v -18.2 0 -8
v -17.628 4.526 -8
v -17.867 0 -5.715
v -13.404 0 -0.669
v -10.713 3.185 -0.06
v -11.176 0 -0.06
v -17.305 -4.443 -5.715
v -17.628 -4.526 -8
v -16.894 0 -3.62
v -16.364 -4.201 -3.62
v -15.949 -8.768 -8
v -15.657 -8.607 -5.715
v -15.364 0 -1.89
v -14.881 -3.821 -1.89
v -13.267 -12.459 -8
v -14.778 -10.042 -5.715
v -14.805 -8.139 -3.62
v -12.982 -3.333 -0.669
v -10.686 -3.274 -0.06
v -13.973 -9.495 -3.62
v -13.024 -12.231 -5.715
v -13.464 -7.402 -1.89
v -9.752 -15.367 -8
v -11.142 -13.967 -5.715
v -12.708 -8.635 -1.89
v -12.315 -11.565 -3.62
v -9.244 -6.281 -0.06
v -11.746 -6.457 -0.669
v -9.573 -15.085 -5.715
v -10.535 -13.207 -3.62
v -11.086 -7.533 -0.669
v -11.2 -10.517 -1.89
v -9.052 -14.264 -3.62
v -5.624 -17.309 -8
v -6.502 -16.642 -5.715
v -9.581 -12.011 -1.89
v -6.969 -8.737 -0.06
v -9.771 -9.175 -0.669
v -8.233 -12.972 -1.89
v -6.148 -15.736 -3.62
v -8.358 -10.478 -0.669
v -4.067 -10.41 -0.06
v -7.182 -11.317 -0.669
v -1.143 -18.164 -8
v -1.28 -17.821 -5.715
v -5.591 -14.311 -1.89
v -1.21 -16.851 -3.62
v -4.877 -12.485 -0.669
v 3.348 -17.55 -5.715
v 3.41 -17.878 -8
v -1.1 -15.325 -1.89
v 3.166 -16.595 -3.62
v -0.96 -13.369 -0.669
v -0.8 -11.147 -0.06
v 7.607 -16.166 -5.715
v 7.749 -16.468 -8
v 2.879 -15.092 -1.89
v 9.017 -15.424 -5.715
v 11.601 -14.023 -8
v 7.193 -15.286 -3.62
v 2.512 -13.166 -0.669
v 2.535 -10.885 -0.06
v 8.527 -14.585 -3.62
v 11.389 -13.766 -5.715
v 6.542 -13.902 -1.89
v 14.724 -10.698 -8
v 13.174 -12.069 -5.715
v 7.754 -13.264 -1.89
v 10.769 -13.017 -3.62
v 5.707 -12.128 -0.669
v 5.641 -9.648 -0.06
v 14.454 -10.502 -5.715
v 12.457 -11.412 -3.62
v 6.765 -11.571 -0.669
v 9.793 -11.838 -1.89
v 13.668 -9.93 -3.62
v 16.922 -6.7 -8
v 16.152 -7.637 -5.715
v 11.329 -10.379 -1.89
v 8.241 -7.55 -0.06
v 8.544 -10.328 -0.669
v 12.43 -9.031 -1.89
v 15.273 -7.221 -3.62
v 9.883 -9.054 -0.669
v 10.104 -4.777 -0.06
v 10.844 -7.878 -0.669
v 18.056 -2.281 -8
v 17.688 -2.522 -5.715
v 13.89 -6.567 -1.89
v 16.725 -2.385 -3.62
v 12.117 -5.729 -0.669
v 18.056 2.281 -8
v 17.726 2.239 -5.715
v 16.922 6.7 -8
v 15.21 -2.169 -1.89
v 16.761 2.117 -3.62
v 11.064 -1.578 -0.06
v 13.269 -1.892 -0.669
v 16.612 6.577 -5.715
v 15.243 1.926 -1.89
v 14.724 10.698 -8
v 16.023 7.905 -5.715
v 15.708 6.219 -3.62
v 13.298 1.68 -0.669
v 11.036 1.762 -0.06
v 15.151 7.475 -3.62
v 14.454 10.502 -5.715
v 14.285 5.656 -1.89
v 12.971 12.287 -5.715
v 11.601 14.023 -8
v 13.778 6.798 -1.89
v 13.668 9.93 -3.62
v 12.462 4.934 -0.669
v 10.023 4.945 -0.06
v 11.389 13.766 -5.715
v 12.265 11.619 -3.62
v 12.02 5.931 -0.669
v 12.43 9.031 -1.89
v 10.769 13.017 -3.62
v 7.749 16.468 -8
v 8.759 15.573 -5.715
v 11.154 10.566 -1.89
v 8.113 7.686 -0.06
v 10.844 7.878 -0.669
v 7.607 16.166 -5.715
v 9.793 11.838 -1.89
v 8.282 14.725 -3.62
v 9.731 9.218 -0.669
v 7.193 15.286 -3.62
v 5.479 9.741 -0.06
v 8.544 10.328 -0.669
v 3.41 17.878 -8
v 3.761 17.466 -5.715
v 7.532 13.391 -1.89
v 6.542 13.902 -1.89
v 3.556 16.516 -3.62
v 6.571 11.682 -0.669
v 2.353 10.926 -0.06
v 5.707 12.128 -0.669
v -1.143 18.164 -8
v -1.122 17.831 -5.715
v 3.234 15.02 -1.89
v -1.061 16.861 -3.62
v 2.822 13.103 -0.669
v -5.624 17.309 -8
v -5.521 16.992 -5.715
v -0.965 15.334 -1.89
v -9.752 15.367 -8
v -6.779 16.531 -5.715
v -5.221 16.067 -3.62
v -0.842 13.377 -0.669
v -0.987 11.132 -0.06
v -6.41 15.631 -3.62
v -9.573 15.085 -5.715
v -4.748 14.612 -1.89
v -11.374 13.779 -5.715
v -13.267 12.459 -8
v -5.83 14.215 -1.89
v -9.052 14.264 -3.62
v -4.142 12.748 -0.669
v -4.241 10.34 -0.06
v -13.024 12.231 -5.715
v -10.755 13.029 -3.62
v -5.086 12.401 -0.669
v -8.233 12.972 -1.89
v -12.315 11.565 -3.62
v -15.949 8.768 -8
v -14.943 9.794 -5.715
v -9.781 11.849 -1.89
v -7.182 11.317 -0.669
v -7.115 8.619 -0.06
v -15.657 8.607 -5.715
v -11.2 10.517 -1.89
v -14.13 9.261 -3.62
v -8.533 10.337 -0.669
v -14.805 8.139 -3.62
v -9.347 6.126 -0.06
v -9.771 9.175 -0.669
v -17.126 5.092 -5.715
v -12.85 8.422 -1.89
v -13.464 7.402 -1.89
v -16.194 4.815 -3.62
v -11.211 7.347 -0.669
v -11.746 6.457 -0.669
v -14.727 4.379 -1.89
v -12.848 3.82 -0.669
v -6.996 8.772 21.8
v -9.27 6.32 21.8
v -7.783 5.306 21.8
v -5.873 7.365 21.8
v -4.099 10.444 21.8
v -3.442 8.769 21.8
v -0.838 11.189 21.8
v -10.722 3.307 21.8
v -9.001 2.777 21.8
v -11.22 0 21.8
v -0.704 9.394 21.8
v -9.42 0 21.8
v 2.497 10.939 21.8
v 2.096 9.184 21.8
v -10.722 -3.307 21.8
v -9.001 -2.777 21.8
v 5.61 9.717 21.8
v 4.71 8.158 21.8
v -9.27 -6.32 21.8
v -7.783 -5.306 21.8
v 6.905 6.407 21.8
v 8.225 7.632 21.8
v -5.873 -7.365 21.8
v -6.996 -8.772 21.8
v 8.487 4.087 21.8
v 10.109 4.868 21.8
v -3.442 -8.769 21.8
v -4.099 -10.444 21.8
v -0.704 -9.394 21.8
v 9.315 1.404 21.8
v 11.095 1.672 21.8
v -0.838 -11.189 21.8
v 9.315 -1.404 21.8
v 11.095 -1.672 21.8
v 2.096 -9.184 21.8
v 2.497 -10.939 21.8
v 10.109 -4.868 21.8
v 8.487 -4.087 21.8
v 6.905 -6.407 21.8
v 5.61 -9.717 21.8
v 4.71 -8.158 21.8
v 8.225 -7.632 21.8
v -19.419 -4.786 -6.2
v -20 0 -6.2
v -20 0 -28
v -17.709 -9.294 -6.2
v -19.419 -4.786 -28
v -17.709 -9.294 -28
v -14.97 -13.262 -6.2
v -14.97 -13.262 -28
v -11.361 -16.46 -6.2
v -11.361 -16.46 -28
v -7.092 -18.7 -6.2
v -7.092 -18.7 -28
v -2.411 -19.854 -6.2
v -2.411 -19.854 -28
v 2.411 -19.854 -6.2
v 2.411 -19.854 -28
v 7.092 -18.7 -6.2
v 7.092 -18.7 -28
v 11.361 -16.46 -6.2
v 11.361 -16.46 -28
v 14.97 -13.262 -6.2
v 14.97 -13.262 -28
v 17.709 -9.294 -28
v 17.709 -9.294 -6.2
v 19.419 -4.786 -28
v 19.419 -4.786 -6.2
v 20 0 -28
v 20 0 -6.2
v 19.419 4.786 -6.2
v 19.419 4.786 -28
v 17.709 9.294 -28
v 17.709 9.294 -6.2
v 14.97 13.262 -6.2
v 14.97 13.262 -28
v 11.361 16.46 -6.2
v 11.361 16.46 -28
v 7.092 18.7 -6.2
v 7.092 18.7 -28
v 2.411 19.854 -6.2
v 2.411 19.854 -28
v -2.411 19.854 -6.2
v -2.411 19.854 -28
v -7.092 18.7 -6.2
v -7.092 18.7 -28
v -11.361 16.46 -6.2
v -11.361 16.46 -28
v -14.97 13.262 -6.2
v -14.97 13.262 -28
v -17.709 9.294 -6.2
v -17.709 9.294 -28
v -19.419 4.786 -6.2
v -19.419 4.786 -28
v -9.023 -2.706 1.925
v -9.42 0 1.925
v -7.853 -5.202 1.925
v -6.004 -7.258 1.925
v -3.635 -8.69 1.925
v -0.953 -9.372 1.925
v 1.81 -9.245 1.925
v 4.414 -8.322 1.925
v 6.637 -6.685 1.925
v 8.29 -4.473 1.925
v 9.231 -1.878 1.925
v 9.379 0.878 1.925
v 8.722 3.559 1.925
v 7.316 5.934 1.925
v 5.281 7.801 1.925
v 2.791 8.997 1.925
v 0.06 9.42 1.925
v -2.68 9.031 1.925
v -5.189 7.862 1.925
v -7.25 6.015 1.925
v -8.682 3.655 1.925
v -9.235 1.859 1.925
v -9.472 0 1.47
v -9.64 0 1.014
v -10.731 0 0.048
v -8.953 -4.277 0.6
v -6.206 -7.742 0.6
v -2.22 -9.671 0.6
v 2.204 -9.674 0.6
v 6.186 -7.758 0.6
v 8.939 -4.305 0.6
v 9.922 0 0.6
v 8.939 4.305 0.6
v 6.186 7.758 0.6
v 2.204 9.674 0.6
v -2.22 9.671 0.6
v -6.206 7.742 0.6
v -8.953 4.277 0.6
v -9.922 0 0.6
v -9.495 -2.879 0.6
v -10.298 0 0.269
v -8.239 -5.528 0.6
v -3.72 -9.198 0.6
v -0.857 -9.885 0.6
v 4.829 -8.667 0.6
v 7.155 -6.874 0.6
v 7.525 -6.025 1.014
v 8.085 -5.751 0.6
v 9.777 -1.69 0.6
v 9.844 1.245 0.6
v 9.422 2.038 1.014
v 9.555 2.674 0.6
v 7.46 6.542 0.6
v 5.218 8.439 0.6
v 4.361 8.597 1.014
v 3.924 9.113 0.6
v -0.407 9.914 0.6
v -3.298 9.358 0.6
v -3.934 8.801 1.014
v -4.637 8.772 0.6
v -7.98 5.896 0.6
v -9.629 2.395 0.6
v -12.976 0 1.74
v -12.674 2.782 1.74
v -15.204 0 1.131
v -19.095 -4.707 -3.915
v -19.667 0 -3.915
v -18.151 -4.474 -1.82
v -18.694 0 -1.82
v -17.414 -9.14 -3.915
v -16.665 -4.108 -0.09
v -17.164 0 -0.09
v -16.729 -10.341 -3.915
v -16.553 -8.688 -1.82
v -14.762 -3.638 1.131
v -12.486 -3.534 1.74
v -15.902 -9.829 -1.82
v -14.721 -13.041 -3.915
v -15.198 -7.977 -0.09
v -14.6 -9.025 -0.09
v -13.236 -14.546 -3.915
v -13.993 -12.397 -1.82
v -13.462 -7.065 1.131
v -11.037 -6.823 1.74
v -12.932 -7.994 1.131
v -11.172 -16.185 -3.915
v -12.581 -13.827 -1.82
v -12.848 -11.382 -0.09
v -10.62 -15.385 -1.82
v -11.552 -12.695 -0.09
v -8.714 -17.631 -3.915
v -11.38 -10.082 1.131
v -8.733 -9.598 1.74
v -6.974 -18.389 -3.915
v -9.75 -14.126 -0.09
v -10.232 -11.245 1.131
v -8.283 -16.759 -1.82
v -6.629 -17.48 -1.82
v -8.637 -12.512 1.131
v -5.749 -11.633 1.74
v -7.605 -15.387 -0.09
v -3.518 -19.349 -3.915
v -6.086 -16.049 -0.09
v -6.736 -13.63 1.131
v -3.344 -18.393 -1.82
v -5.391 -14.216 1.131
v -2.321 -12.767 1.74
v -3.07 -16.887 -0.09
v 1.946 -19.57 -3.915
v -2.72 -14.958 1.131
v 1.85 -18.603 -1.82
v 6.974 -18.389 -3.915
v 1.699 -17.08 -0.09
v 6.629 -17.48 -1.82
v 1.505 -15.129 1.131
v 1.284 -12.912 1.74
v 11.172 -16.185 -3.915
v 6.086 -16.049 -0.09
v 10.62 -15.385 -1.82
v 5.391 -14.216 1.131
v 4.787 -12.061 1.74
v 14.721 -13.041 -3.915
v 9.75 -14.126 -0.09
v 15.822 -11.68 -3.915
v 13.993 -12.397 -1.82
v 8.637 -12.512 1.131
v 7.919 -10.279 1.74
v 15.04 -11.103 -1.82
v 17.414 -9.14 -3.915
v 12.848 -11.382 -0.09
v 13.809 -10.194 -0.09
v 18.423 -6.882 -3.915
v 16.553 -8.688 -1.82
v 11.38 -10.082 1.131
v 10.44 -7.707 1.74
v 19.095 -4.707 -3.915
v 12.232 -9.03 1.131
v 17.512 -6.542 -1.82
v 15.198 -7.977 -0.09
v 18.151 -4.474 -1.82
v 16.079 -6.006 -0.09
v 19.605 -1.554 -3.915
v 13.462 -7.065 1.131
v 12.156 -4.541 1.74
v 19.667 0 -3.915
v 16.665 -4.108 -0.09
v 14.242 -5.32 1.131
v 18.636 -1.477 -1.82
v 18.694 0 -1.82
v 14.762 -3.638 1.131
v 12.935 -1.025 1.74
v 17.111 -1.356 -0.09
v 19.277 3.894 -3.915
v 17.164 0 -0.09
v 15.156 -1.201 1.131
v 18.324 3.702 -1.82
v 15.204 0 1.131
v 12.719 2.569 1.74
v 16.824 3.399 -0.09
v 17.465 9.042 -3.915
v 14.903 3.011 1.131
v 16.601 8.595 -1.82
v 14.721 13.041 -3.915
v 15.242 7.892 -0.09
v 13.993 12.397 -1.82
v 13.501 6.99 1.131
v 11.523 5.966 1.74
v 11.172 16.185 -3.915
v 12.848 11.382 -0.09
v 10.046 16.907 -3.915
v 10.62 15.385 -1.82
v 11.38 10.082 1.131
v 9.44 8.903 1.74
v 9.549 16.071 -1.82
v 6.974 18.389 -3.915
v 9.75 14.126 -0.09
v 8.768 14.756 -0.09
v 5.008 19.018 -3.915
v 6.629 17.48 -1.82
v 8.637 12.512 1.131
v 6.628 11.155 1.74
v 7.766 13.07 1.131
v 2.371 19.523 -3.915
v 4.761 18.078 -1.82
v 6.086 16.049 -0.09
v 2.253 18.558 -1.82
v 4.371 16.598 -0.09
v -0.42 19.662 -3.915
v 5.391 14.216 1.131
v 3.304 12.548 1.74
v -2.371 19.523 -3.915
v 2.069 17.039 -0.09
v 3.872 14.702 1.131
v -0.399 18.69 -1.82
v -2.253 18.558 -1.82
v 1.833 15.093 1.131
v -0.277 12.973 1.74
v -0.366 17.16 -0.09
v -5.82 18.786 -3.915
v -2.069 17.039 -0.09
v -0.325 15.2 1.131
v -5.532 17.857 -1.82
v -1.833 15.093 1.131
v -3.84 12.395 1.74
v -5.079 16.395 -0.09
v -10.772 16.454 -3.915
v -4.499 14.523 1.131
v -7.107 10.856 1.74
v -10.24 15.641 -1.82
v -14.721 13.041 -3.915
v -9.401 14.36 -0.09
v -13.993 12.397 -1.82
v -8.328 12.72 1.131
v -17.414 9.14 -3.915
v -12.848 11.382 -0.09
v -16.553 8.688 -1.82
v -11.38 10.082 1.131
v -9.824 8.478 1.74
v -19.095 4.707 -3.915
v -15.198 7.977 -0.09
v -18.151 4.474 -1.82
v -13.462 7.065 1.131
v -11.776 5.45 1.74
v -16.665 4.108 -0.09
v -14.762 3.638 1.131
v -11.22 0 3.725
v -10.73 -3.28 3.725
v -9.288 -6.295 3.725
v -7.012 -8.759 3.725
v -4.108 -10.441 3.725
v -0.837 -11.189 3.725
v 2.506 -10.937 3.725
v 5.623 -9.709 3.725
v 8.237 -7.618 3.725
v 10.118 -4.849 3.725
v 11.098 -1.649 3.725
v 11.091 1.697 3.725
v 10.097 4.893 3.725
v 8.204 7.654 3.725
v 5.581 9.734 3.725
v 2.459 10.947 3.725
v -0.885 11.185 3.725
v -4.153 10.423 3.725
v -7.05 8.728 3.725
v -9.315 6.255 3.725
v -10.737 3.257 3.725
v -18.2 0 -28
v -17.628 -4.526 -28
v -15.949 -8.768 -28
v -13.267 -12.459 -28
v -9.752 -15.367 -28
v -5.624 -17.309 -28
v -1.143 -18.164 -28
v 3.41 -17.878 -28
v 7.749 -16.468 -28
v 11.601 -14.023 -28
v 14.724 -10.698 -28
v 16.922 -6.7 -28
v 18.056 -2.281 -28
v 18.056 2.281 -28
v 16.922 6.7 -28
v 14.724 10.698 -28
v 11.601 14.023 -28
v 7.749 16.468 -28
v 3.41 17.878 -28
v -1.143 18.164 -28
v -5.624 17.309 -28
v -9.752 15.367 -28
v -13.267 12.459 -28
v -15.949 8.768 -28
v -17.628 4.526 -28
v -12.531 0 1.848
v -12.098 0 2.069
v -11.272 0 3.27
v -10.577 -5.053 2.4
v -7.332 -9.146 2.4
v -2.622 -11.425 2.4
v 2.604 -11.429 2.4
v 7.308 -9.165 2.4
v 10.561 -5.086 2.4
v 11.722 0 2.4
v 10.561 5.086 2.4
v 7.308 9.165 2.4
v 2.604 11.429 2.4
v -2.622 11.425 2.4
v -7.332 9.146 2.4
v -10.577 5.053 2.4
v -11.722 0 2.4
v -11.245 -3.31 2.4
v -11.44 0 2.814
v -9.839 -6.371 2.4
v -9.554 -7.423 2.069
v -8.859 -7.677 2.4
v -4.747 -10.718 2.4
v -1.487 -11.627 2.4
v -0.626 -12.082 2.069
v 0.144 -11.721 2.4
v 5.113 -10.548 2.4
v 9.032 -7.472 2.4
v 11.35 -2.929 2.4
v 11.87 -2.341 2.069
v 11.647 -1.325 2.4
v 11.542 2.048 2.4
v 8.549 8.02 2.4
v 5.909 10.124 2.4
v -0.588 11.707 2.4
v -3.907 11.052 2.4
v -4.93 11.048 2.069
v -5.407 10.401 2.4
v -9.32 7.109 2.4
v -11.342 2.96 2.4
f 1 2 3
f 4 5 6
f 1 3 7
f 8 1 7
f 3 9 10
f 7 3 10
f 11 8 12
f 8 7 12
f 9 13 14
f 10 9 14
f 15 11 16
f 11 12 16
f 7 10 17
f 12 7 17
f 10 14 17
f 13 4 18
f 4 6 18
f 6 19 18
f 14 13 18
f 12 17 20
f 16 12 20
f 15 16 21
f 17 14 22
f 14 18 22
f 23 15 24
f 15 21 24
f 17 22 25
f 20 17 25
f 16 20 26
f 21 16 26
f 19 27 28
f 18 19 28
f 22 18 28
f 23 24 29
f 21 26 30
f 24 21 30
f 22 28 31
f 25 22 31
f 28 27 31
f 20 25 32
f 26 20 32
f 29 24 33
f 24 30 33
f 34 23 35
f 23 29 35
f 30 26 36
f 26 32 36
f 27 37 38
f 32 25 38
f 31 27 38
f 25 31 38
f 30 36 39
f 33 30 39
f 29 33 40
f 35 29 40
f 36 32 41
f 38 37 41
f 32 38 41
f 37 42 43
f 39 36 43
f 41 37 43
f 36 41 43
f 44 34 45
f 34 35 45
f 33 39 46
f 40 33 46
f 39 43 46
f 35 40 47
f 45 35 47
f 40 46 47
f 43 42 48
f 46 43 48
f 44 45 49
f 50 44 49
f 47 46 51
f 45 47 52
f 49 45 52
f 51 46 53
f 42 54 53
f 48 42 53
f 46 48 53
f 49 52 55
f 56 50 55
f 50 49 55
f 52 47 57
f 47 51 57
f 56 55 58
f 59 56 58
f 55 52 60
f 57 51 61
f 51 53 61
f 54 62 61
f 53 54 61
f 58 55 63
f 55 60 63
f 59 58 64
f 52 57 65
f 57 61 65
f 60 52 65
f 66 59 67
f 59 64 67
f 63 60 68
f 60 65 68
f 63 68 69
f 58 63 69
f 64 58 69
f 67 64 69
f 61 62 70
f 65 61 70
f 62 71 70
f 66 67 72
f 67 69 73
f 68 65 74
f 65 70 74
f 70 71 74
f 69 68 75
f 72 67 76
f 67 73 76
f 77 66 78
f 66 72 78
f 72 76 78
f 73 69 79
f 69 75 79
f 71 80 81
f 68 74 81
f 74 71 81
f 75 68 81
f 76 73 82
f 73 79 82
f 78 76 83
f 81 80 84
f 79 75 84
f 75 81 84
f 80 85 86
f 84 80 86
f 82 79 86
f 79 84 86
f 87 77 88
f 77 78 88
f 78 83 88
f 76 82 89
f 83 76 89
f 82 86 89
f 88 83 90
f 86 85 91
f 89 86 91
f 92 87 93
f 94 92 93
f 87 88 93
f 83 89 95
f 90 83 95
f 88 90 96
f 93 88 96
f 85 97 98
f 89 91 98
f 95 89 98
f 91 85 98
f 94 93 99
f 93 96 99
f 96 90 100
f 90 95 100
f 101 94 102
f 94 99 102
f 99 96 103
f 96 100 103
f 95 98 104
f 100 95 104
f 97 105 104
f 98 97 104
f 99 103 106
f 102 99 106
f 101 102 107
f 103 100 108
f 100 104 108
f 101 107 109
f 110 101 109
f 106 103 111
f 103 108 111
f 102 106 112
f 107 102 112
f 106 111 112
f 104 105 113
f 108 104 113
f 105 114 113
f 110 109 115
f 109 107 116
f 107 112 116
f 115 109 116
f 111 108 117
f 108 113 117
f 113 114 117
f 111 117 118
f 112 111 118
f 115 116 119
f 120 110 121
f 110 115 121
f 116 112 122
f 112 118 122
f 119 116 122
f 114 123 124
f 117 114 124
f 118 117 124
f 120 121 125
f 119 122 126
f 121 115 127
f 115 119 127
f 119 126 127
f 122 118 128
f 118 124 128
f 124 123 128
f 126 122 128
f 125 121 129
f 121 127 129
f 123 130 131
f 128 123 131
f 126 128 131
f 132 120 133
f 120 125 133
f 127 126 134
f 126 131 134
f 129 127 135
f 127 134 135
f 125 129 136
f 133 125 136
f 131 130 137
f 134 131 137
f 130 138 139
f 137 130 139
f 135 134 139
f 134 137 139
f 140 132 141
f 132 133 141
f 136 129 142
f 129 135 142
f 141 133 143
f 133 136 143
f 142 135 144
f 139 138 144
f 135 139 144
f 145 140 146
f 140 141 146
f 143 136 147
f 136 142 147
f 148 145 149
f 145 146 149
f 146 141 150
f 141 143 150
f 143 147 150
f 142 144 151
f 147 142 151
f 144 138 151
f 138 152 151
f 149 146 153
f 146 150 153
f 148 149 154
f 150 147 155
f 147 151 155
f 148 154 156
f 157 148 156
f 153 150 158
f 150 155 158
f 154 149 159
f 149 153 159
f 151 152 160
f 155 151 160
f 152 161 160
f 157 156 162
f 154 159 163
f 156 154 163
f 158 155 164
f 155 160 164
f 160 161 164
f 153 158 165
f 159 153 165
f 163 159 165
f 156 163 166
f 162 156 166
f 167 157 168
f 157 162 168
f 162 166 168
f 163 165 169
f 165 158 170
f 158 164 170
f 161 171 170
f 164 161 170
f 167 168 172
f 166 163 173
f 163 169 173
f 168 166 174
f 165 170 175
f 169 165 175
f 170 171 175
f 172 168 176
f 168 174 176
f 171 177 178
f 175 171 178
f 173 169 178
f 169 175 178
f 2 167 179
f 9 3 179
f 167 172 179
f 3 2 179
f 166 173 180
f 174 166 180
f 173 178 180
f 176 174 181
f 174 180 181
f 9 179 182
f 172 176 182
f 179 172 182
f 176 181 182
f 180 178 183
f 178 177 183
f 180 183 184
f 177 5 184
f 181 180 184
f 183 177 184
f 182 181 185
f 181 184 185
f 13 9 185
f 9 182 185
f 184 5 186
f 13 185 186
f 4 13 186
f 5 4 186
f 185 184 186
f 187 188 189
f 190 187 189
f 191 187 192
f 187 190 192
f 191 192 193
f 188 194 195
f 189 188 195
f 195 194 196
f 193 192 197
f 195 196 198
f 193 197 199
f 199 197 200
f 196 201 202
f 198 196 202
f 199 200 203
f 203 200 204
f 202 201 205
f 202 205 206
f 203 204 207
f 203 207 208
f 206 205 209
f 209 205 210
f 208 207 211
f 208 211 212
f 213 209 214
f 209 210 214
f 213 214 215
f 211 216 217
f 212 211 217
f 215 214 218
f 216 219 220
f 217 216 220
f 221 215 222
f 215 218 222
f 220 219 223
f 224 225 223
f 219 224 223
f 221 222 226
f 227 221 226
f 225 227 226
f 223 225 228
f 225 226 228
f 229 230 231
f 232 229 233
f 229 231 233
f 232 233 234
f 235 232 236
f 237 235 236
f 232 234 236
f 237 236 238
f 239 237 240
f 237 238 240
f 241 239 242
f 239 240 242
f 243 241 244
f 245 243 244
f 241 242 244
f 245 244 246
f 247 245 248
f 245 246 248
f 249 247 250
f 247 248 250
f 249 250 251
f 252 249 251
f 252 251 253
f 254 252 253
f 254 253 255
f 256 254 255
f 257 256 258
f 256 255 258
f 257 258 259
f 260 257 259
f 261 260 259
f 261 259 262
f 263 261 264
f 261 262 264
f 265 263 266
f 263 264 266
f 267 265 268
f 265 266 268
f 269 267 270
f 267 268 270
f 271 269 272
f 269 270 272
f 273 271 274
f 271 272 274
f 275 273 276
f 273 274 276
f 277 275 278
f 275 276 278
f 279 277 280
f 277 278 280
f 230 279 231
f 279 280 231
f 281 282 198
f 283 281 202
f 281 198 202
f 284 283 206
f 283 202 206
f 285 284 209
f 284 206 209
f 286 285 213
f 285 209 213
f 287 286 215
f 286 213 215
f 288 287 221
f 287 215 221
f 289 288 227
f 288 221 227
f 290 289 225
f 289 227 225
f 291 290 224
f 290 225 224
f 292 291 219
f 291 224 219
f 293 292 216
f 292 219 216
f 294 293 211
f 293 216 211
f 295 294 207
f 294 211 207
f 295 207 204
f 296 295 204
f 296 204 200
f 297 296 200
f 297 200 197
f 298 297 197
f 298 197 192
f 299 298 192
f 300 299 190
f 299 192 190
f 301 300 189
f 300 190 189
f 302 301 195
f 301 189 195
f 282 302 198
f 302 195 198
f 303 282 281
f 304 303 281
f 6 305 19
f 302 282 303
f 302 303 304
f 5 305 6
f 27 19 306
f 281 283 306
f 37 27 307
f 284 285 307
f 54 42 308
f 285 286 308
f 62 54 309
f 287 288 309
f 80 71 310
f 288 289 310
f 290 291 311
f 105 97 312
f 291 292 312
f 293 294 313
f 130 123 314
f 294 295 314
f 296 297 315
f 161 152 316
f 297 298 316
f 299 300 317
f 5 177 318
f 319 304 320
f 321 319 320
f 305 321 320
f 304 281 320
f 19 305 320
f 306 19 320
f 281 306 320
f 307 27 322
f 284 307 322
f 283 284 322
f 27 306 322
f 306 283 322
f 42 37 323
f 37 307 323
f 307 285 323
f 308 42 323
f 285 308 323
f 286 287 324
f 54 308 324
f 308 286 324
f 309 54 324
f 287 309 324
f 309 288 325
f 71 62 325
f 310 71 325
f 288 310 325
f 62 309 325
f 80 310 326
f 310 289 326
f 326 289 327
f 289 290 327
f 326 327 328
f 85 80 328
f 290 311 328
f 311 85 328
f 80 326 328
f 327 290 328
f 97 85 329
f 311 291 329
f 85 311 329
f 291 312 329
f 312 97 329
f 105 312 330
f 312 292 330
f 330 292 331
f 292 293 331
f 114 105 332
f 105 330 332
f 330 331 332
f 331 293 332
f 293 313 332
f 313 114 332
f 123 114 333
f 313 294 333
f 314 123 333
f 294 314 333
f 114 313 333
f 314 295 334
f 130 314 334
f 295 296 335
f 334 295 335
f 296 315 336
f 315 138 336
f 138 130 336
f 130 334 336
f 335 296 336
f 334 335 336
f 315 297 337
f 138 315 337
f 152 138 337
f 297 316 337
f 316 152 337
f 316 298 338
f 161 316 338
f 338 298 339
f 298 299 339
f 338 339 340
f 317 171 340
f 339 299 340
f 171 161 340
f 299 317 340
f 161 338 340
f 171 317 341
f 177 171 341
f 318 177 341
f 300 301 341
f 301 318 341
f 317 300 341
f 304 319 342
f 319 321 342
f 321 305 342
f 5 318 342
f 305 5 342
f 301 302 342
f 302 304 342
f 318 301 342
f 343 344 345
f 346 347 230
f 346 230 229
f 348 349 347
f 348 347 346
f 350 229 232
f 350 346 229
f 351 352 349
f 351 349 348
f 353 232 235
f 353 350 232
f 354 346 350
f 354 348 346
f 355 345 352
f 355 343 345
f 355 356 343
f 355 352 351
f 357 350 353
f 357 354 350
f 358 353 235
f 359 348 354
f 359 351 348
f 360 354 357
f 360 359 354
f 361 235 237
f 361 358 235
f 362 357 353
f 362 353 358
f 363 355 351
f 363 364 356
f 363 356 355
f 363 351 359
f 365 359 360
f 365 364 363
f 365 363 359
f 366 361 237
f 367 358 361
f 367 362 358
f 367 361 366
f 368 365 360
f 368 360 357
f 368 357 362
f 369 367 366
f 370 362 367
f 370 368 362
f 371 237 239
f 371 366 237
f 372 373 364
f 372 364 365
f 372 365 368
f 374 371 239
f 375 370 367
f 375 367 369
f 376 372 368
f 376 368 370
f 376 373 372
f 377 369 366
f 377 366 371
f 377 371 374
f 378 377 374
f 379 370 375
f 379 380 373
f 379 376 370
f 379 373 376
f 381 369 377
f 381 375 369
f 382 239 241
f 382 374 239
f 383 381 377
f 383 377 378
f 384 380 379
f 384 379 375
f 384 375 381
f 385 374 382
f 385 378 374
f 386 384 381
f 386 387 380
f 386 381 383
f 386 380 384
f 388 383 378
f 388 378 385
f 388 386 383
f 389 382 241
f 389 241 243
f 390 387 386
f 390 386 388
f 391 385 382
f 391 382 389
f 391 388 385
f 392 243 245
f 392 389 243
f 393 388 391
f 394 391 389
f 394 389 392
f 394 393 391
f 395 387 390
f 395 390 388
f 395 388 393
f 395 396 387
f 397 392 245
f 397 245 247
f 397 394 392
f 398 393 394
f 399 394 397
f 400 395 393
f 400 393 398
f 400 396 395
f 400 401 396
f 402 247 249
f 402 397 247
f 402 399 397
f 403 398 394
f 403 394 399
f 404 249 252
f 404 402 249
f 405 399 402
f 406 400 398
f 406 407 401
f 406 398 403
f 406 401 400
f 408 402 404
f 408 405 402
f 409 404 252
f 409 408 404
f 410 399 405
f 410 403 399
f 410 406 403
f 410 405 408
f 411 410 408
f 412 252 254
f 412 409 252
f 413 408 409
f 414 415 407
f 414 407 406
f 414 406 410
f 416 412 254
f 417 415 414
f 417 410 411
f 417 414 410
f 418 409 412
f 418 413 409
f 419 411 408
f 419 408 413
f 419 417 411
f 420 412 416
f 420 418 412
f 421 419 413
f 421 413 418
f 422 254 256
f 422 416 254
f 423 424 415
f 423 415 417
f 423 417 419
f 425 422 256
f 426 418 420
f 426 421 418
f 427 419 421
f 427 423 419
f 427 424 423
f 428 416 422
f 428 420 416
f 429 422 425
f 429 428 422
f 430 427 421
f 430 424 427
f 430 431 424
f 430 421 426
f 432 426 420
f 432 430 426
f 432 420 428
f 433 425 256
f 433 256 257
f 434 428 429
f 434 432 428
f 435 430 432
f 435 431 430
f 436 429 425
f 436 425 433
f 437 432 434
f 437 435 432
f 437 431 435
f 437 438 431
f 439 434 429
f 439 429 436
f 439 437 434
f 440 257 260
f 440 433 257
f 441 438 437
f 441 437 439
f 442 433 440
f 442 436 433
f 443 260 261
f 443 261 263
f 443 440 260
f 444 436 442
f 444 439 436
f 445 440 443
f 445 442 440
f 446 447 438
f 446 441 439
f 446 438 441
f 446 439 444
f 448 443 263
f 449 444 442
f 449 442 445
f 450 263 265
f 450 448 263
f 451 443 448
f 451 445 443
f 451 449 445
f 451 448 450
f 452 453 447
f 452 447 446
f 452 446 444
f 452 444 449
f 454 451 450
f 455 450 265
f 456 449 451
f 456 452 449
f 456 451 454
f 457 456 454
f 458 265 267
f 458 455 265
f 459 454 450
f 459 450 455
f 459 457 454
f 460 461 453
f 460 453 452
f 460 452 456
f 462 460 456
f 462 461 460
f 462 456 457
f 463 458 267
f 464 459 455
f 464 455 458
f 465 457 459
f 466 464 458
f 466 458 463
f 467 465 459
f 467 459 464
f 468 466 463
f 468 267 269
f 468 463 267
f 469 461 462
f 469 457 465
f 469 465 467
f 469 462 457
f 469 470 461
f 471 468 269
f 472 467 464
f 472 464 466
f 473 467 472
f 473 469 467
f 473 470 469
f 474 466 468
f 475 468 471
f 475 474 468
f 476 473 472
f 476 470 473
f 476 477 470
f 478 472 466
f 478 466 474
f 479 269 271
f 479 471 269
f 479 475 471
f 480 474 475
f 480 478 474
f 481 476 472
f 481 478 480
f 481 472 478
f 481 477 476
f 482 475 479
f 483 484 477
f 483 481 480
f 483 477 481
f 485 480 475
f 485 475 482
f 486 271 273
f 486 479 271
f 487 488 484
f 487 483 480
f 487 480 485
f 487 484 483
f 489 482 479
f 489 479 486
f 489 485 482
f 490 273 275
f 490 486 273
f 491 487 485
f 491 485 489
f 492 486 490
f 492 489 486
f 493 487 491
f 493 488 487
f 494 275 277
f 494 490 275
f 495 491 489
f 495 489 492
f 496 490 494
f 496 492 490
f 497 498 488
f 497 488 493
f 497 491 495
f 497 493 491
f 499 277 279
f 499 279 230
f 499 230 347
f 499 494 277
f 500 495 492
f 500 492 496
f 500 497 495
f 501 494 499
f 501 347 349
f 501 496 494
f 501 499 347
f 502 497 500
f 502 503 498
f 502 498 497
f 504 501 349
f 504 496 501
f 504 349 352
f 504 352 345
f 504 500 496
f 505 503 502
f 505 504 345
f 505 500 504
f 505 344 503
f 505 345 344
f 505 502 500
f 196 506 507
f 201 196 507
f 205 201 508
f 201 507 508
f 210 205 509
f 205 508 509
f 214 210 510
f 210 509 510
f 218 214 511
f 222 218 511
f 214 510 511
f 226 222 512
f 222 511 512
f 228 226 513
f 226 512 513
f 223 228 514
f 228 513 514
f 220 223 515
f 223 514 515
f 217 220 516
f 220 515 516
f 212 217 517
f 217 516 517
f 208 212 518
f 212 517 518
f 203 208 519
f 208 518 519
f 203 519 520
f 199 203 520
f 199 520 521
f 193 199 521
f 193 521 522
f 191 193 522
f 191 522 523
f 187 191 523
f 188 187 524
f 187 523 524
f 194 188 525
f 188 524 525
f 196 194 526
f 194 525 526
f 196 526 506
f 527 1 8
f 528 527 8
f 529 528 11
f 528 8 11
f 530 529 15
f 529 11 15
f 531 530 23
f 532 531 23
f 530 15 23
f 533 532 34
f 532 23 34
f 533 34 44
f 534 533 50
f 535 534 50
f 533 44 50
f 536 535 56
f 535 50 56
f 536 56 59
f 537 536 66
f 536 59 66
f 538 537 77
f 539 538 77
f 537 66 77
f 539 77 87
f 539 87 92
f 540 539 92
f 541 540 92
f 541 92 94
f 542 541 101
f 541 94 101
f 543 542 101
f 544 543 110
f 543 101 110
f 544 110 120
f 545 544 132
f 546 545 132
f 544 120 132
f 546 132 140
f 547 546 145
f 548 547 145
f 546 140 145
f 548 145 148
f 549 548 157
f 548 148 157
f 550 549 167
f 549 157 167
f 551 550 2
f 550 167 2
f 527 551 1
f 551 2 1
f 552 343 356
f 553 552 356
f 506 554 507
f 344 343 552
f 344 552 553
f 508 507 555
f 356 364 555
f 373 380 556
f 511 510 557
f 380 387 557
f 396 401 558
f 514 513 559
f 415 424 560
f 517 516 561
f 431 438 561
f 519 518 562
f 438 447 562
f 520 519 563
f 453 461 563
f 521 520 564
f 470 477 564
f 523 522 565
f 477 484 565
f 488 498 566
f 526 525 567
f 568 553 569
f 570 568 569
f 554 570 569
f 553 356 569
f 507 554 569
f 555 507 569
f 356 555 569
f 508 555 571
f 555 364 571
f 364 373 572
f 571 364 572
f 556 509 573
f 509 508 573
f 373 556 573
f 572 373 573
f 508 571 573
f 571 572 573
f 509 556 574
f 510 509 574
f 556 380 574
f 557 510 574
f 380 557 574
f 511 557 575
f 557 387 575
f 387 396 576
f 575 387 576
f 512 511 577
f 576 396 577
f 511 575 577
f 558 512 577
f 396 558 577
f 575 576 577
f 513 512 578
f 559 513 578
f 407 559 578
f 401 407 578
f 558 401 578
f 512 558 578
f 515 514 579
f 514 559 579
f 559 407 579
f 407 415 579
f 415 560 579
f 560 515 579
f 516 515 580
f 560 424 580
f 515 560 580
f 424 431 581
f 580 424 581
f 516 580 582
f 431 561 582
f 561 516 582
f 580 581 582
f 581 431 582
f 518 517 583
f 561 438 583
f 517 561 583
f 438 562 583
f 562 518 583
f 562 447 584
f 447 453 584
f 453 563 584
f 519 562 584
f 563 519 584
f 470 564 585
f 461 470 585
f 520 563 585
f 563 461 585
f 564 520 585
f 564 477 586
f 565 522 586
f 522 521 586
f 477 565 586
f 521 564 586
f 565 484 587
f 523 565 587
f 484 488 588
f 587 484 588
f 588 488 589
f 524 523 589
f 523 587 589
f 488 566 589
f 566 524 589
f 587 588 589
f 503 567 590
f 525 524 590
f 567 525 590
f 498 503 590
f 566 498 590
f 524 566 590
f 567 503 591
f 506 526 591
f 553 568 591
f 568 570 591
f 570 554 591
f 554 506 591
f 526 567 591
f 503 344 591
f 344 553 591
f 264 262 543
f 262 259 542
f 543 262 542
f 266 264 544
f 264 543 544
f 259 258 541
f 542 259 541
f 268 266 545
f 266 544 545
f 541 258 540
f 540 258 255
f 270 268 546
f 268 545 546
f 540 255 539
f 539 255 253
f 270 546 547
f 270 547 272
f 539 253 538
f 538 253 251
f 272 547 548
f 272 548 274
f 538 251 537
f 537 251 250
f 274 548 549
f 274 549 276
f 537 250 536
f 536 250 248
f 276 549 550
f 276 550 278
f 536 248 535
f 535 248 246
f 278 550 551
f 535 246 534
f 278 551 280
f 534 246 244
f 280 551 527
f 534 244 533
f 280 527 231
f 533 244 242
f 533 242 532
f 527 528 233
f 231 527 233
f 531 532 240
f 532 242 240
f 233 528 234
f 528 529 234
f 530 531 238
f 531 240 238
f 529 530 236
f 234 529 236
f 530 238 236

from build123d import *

# Parameters (mm, degrees)
FILLET_R    = 8
FILLET001_R = 8
FILLET002_R = 2
FILLET003_R = 2


with BuildPart() as part:
    # Sketch → Revolution (revolve)
    with BuildSketch(Plane.XZ):
        Polygon((-11.22, 21.8), (-11.22, 1.8), (-20, 1.8), (-20, -28), (-18.2, -28), (-18.2, 0), (-9.42, 0), (-9.42, 21.8), align=None)
    revolve(axis=Axis((0, 0, 0), (0, 0, 1)))

    # Fillet
    fillet_edges = [part.edges().sort_by_distance(p)[0] for p in [
        (18.2, 0, 0),
    ]]
    fillet(fillet_edges, radius=FILLET_R)

    # Fillet001
    fillet001_edges = [part.edges().sort_by_distance(p)[0] for p in [
        (20, 0, 1.8),
    ]]
    fillet(fillet001_edges, radius=FILLET001_R)

    # Fillet002
    fillet002_edges = [part.edges().sort_by_distance(p)[0] for p in [
        (11.22, 0, 1.8),
    ]]
    fillet(fillet002_edges, radius=FILLET002_R)

    # Fillet003
    fillet003_edges = [part.edges().sort_by_distance(p)[0] for p in [
        (9.42, 0, 0),
    ]]
    fillet(fillet003_edges, radius=FILLET003_R)


solid = part.part
